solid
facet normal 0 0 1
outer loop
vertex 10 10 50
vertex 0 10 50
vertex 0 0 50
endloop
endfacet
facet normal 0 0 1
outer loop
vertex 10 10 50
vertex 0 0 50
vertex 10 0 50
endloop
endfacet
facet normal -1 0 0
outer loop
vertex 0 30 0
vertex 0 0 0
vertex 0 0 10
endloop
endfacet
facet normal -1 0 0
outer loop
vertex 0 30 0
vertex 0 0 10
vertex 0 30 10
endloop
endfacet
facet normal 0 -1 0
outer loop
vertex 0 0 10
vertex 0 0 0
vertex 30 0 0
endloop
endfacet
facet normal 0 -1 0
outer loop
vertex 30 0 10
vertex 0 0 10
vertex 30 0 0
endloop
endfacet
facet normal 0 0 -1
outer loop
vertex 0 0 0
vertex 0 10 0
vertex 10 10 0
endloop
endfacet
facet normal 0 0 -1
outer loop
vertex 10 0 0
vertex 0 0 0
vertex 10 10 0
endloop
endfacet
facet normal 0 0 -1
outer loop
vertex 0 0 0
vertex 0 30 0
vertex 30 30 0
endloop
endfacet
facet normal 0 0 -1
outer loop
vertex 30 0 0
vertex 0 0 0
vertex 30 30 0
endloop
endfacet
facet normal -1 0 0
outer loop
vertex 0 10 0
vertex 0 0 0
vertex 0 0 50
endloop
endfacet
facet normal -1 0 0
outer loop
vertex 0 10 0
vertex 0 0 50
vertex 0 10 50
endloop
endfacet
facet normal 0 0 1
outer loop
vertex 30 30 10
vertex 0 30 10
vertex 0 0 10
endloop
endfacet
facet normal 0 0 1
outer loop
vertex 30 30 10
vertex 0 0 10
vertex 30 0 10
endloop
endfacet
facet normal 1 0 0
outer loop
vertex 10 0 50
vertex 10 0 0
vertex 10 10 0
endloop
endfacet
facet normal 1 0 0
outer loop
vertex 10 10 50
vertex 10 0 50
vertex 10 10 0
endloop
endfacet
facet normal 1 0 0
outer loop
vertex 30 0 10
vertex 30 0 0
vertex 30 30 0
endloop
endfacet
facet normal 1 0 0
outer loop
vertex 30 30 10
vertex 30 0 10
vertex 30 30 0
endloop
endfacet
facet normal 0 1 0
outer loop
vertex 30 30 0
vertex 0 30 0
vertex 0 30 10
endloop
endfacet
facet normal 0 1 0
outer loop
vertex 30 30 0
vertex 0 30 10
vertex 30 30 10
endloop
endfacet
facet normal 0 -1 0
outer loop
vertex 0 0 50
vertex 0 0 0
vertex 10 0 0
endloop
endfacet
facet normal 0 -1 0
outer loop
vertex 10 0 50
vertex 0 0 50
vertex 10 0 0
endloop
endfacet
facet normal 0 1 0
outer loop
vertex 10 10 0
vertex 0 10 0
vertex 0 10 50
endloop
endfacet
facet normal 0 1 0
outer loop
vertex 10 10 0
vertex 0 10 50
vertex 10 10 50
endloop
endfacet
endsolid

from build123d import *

# Parameters (mm, degrees)
BOX_W        = 30
BOX_H        = 30
BOX_DEPTH    = 10
BOX001_W     = 10
BOX001_H     = 10
BOX001_DEPTH = 50


with BuildPart() as box:
    # Box → Box (new body)
    with BuildSketch(Plane.XY):
        with Locations((15, 15)):
            Rectangle(BOX_W, BOX_H)
    extrude(amount=BOX_DEPTH)


with BuildPart() as box001:
    # Box001 → Box001 (new body)
    with BuildSketch(Plane.XY):
        with Locations((5, 5)):
            Rectangle(BOX001_W, BOX001_H)
    extrude(amount=BOX001_DEPTH)


solid = Compound([box.part, box001.part])
